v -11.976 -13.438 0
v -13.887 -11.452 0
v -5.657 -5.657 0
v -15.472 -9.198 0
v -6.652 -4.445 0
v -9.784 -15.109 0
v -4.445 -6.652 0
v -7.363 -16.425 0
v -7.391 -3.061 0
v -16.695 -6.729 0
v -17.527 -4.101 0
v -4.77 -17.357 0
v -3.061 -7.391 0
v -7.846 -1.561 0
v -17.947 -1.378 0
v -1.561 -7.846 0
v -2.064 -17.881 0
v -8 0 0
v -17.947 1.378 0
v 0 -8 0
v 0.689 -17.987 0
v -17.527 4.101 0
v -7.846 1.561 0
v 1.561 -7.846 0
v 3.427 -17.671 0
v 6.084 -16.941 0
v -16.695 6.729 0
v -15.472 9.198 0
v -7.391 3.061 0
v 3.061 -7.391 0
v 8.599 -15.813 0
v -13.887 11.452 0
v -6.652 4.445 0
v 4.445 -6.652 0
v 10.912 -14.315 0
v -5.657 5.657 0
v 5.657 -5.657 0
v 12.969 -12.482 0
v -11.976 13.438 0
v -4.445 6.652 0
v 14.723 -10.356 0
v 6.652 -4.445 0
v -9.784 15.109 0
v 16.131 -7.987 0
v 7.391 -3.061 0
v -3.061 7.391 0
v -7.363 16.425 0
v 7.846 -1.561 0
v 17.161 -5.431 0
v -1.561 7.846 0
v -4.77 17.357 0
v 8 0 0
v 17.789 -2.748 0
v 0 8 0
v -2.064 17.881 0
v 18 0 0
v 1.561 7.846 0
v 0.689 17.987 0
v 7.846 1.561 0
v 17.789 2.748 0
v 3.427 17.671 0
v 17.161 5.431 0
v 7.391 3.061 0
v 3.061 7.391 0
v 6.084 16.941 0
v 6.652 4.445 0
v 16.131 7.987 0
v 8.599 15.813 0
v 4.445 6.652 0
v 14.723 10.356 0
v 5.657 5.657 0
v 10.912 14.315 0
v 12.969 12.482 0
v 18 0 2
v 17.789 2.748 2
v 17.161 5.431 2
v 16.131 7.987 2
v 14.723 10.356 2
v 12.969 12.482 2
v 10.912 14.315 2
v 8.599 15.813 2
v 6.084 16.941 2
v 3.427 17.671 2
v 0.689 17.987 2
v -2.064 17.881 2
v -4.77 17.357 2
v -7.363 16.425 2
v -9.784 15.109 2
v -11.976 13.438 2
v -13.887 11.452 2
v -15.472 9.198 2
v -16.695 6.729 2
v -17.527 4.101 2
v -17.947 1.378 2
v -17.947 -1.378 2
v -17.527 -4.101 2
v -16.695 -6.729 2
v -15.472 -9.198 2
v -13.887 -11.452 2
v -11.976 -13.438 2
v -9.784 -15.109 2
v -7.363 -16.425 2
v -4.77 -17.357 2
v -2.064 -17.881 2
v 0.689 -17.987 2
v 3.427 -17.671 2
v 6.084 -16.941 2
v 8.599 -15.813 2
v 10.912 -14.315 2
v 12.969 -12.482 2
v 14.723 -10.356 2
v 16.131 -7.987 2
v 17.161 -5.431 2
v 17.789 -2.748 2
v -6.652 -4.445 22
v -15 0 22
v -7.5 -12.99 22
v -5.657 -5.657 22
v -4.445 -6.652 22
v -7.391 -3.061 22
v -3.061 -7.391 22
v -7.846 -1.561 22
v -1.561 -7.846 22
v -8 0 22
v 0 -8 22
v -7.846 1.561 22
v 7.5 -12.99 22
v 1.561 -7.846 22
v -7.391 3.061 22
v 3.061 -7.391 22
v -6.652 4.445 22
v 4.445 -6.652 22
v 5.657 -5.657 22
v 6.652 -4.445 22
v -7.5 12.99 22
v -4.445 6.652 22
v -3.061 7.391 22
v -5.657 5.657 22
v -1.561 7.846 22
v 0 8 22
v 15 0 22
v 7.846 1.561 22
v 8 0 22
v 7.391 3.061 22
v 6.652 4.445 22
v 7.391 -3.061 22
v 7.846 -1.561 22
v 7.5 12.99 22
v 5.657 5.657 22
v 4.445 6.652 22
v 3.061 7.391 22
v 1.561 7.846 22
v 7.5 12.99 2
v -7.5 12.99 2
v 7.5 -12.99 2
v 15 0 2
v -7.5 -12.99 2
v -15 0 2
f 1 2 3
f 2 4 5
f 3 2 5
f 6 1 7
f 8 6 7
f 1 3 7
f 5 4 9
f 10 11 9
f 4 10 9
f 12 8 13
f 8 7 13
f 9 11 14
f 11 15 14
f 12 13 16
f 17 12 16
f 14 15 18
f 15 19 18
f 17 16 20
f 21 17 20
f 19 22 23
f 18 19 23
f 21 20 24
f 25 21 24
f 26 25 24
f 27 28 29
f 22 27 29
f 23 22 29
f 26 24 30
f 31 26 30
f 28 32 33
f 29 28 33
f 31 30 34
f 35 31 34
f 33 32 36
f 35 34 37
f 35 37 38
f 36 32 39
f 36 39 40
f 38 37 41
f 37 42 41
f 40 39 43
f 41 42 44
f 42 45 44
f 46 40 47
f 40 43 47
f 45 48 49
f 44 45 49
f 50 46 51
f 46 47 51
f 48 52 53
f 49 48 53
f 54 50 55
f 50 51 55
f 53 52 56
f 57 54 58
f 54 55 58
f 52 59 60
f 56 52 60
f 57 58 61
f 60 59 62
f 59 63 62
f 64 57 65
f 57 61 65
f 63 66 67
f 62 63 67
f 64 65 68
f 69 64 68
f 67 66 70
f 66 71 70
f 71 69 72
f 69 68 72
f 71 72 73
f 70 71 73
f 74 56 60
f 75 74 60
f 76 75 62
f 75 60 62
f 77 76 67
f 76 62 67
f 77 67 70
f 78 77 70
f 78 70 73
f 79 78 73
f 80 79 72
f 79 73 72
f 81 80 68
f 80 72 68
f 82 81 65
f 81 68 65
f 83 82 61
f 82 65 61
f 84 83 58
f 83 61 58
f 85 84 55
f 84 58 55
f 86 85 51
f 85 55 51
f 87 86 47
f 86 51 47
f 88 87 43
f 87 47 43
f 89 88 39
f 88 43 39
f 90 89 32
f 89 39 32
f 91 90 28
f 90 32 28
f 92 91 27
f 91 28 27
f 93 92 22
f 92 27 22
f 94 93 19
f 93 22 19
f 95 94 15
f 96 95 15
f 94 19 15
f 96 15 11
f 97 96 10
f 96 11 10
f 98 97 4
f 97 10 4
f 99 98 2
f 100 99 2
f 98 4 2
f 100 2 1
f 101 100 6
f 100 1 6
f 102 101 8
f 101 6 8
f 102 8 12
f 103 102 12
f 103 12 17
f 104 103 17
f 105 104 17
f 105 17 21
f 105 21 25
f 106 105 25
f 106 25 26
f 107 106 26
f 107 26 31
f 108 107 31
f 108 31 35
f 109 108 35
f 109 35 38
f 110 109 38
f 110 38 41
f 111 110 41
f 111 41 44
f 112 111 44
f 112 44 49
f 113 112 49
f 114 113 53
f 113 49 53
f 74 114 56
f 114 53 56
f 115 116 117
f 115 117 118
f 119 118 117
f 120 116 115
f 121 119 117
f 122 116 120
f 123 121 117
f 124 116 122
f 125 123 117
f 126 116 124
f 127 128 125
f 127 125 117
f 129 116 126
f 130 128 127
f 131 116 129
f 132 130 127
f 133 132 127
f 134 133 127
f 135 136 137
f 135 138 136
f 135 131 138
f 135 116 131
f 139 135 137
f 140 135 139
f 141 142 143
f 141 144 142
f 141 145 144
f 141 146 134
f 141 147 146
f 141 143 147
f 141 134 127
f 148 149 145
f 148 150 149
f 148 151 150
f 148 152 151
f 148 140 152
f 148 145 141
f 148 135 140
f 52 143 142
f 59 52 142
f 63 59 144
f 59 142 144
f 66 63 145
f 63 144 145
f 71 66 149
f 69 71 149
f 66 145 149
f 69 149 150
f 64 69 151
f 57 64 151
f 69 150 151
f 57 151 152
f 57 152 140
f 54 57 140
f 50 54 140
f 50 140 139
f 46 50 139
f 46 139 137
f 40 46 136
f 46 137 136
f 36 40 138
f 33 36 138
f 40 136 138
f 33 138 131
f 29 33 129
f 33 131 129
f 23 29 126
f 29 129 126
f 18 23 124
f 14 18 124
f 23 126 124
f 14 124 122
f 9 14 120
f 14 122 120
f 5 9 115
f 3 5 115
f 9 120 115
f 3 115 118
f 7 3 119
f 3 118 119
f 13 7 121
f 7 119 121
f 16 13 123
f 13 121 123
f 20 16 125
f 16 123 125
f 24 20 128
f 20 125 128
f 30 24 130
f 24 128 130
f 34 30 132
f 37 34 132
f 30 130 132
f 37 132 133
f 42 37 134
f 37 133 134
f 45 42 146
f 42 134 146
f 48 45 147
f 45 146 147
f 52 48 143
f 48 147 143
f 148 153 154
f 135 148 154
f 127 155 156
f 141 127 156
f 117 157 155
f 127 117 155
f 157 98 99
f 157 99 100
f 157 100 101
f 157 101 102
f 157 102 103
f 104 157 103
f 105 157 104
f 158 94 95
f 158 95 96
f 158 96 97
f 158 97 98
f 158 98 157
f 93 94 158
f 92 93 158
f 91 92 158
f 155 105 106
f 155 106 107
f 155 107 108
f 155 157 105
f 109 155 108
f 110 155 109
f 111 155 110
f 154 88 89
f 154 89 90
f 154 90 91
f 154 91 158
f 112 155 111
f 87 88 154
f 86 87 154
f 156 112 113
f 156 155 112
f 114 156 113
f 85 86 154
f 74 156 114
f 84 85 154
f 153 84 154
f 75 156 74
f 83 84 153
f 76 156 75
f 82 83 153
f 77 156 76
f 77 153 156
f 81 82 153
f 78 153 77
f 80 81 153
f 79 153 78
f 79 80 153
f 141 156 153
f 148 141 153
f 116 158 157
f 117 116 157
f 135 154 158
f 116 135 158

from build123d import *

# Parameters (mm, degrees)
SKETCH_R     = 18
PAD_DEPTH    = 2
PAD001_DEPTH = 20
SKETCH002_R  = 8
POCKET_DEPTH = 22


with BuildPart() as part:
    # Sketch → Pad (new body)
    with BuildSketch(Plane.XY):
        Circle(SKETCH_R)
    extrude(amount=PAD_DEPTH)

    # Sketch001 (on Face3 of Pad) → Pad001 (join)
    with BuildSketch(Plane.XY.offset(2)):
        Polygon((15, 0), (7.5, 12.990381), (-7.5, 12.990381), (-15, 0), (-7.5, -12.990381), (7.5, -12.990381), align=None)
    extrude(amount=PAD001_DEPTH)

    # Sketch002 (on Face10 of Pad001) → Pocket (cut)
    with BuildSketch(Plane.XY.offset(22)):
        Circle(SKETCH002_R)
    extrude(amount=-POCKET_DEPTH, mode=Mode.SUBTRACT)


solid = part.part
